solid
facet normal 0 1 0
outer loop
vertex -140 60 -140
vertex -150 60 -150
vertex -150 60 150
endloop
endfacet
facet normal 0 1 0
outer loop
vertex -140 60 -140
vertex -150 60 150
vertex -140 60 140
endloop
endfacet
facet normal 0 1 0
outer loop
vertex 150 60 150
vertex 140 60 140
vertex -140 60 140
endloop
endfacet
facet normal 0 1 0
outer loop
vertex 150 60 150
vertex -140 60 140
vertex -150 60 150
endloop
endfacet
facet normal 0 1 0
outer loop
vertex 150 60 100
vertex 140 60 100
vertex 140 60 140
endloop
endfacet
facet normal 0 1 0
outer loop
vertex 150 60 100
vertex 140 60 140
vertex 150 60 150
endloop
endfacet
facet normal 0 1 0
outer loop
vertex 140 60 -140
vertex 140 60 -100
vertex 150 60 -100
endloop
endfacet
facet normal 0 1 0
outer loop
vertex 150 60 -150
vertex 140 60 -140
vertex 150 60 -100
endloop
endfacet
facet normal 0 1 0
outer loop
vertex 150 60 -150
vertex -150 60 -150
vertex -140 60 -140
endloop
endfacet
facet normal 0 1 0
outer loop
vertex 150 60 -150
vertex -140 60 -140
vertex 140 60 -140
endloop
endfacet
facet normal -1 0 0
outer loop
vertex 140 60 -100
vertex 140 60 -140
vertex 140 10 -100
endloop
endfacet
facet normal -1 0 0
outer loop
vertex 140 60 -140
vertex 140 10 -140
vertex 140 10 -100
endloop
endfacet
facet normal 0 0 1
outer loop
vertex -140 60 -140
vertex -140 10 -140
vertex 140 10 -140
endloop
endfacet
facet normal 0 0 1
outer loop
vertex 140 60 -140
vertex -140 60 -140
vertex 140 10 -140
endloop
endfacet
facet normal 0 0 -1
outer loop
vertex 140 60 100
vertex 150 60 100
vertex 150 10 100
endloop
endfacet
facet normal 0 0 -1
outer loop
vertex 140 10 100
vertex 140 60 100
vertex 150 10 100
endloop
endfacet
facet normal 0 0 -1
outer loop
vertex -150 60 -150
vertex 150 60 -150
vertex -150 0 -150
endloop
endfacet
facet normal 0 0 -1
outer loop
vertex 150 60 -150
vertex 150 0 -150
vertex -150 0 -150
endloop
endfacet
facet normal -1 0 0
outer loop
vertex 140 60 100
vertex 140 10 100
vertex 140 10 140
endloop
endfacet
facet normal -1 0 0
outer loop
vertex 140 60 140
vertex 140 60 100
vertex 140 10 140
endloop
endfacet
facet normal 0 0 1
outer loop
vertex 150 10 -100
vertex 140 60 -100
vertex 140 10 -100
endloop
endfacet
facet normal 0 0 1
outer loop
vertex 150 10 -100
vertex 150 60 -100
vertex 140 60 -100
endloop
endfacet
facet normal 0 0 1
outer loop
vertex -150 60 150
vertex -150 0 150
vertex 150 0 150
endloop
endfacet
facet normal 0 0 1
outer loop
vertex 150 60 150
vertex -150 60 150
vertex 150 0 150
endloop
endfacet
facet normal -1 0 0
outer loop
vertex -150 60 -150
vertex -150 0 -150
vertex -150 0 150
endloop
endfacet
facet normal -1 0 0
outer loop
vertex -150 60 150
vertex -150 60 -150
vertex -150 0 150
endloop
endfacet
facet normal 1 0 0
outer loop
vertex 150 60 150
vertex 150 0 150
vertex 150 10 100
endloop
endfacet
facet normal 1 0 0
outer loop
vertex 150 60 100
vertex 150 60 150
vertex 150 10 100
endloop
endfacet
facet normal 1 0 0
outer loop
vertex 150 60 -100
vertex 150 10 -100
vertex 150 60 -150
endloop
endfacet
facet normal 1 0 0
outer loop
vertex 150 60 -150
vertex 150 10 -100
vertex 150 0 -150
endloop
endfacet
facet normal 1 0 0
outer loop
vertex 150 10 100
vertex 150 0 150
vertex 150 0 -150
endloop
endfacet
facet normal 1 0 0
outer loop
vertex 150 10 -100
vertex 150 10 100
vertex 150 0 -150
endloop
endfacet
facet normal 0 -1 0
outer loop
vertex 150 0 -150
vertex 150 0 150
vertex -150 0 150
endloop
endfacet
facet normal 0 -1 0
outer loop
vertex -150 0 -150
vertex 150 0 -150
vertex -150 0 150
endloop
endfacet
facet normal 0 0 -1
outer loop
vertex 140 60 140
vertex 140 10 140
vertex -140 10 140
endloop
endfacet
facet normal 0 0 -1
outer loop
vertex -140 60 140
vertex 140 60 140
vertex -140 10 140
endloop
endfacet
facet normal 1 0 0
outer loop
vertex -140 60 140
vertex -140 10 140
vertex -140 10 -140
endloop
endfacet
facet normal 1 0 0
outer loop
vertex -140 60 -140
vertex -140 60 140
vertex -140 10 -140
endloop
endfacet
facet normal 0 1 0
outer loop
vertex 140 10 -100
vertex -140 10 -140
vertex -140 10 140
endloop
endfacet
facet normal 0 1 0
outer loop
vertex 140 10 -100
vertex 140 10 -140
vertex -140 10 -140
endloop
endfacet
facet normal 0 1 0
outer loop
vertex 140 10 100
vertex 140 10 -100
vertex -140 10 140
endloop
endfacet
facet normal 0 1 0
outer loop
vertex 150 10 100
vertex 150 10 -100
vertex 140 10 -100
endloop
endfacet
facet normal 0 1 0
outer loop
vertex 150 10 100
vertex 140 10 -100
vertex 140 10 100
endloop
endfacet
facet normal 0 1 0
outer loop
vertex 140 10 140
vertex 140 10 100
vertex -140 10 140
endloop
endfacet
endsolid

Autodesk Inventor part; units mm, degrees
ref_plane "YZ Plane" through (0, 0, 0) normal (1, 0, 0) x (0, 1, 0)
ref_plane "XZ Plane" through (0, 0, 0) normal (0, 1, 0) x (-1, 0, 0)
ref_plane "XY Plane" through (0, 0, 0) normal (0, 0, 1) x (1, 0, 0)
sketch "草图1" plane through (0, 0, 0) normal (0, 1, 0) x (-1, 0, 0)
  line L0 (150, 150) -> (-150, 150)
  line L1 (-150, 150) -> (-150, -150)
  line L2 (-150, -150) -> (150, -150)
  line L3 (150, -150) -> (150, 150)
  line L4 (150, 150) -> (-150, -150) construction
  line L5 (-150, 150) -> (150, -150) construction
  point P0 (0, 0)
  dimension "d0" = 300
  dimension "d1" = 300
extrude "拉伸1" add sketch "草图1" along normal blind 10
sketch "草图3" plane through (0, 10, 0) normal (0, 1, 0) x (1, 0, 0)
  line L0 (-150, -150) -> (-150, 150) projected
  line L1 (-150, 150) -> (150, 150) projected
  line L2 (150, 150) -> (150, -150) projected
  line L3 (150, -150) -> (-150, -150) projected
  line L4 (-140, -140) -> (-140, 140)
  line L5 (-140, 140) -> (140, 140)
  line L6 (140, 140) -> (140, -140)
  line L7 (140, -140) -> (-140, -140)
  point P0 (0, 0)
  dimension "d5" = 10
extrude "拉伸2" add sketch "草图3" along normal blind 50
sketch "草图4" plane through (150, 0, 150) normal (1, 0, 0) x (0, 0, -1)
  line L0 (0, 60) -> (300, 60) projected
  line L1 (300, 60) -> (300, 0) projected
  line L2 (300, 0) -> (0, 0) projected
  line L3 (0, 0) -> (0, 60) projected
  line L4 (0, 0) -> (0, 60) projected
  line L5 (0, 60) -> (50, 60)
  line L6 (300, 60) -> (0, 60) projected
  line L7 (300, 60) -> (250, 60)
  line L8 (50, 60) -> (50, 10)
  line L9 (300, 0) -> (0, 0) projected
  line L10 (250, 60) -> (250, 10)
  line L11 (290, 10) -> (10, 10) projected
  line L12 (50, 10) -> (250, 10)
  point P0 (150, 0)
  point P1 (250, 0)
  point P2 (250, 60)
  point P3 (53, 0)
  dimension "d8" = 300
  dimension "d9" = 50
  dimension "d18" = 50
extrude "拉伸3" cut sketch "草图4" against normal blind 10 contours L0 L10 L11 L8
properties part number "放书的" material "聚乙烯，低密度"
